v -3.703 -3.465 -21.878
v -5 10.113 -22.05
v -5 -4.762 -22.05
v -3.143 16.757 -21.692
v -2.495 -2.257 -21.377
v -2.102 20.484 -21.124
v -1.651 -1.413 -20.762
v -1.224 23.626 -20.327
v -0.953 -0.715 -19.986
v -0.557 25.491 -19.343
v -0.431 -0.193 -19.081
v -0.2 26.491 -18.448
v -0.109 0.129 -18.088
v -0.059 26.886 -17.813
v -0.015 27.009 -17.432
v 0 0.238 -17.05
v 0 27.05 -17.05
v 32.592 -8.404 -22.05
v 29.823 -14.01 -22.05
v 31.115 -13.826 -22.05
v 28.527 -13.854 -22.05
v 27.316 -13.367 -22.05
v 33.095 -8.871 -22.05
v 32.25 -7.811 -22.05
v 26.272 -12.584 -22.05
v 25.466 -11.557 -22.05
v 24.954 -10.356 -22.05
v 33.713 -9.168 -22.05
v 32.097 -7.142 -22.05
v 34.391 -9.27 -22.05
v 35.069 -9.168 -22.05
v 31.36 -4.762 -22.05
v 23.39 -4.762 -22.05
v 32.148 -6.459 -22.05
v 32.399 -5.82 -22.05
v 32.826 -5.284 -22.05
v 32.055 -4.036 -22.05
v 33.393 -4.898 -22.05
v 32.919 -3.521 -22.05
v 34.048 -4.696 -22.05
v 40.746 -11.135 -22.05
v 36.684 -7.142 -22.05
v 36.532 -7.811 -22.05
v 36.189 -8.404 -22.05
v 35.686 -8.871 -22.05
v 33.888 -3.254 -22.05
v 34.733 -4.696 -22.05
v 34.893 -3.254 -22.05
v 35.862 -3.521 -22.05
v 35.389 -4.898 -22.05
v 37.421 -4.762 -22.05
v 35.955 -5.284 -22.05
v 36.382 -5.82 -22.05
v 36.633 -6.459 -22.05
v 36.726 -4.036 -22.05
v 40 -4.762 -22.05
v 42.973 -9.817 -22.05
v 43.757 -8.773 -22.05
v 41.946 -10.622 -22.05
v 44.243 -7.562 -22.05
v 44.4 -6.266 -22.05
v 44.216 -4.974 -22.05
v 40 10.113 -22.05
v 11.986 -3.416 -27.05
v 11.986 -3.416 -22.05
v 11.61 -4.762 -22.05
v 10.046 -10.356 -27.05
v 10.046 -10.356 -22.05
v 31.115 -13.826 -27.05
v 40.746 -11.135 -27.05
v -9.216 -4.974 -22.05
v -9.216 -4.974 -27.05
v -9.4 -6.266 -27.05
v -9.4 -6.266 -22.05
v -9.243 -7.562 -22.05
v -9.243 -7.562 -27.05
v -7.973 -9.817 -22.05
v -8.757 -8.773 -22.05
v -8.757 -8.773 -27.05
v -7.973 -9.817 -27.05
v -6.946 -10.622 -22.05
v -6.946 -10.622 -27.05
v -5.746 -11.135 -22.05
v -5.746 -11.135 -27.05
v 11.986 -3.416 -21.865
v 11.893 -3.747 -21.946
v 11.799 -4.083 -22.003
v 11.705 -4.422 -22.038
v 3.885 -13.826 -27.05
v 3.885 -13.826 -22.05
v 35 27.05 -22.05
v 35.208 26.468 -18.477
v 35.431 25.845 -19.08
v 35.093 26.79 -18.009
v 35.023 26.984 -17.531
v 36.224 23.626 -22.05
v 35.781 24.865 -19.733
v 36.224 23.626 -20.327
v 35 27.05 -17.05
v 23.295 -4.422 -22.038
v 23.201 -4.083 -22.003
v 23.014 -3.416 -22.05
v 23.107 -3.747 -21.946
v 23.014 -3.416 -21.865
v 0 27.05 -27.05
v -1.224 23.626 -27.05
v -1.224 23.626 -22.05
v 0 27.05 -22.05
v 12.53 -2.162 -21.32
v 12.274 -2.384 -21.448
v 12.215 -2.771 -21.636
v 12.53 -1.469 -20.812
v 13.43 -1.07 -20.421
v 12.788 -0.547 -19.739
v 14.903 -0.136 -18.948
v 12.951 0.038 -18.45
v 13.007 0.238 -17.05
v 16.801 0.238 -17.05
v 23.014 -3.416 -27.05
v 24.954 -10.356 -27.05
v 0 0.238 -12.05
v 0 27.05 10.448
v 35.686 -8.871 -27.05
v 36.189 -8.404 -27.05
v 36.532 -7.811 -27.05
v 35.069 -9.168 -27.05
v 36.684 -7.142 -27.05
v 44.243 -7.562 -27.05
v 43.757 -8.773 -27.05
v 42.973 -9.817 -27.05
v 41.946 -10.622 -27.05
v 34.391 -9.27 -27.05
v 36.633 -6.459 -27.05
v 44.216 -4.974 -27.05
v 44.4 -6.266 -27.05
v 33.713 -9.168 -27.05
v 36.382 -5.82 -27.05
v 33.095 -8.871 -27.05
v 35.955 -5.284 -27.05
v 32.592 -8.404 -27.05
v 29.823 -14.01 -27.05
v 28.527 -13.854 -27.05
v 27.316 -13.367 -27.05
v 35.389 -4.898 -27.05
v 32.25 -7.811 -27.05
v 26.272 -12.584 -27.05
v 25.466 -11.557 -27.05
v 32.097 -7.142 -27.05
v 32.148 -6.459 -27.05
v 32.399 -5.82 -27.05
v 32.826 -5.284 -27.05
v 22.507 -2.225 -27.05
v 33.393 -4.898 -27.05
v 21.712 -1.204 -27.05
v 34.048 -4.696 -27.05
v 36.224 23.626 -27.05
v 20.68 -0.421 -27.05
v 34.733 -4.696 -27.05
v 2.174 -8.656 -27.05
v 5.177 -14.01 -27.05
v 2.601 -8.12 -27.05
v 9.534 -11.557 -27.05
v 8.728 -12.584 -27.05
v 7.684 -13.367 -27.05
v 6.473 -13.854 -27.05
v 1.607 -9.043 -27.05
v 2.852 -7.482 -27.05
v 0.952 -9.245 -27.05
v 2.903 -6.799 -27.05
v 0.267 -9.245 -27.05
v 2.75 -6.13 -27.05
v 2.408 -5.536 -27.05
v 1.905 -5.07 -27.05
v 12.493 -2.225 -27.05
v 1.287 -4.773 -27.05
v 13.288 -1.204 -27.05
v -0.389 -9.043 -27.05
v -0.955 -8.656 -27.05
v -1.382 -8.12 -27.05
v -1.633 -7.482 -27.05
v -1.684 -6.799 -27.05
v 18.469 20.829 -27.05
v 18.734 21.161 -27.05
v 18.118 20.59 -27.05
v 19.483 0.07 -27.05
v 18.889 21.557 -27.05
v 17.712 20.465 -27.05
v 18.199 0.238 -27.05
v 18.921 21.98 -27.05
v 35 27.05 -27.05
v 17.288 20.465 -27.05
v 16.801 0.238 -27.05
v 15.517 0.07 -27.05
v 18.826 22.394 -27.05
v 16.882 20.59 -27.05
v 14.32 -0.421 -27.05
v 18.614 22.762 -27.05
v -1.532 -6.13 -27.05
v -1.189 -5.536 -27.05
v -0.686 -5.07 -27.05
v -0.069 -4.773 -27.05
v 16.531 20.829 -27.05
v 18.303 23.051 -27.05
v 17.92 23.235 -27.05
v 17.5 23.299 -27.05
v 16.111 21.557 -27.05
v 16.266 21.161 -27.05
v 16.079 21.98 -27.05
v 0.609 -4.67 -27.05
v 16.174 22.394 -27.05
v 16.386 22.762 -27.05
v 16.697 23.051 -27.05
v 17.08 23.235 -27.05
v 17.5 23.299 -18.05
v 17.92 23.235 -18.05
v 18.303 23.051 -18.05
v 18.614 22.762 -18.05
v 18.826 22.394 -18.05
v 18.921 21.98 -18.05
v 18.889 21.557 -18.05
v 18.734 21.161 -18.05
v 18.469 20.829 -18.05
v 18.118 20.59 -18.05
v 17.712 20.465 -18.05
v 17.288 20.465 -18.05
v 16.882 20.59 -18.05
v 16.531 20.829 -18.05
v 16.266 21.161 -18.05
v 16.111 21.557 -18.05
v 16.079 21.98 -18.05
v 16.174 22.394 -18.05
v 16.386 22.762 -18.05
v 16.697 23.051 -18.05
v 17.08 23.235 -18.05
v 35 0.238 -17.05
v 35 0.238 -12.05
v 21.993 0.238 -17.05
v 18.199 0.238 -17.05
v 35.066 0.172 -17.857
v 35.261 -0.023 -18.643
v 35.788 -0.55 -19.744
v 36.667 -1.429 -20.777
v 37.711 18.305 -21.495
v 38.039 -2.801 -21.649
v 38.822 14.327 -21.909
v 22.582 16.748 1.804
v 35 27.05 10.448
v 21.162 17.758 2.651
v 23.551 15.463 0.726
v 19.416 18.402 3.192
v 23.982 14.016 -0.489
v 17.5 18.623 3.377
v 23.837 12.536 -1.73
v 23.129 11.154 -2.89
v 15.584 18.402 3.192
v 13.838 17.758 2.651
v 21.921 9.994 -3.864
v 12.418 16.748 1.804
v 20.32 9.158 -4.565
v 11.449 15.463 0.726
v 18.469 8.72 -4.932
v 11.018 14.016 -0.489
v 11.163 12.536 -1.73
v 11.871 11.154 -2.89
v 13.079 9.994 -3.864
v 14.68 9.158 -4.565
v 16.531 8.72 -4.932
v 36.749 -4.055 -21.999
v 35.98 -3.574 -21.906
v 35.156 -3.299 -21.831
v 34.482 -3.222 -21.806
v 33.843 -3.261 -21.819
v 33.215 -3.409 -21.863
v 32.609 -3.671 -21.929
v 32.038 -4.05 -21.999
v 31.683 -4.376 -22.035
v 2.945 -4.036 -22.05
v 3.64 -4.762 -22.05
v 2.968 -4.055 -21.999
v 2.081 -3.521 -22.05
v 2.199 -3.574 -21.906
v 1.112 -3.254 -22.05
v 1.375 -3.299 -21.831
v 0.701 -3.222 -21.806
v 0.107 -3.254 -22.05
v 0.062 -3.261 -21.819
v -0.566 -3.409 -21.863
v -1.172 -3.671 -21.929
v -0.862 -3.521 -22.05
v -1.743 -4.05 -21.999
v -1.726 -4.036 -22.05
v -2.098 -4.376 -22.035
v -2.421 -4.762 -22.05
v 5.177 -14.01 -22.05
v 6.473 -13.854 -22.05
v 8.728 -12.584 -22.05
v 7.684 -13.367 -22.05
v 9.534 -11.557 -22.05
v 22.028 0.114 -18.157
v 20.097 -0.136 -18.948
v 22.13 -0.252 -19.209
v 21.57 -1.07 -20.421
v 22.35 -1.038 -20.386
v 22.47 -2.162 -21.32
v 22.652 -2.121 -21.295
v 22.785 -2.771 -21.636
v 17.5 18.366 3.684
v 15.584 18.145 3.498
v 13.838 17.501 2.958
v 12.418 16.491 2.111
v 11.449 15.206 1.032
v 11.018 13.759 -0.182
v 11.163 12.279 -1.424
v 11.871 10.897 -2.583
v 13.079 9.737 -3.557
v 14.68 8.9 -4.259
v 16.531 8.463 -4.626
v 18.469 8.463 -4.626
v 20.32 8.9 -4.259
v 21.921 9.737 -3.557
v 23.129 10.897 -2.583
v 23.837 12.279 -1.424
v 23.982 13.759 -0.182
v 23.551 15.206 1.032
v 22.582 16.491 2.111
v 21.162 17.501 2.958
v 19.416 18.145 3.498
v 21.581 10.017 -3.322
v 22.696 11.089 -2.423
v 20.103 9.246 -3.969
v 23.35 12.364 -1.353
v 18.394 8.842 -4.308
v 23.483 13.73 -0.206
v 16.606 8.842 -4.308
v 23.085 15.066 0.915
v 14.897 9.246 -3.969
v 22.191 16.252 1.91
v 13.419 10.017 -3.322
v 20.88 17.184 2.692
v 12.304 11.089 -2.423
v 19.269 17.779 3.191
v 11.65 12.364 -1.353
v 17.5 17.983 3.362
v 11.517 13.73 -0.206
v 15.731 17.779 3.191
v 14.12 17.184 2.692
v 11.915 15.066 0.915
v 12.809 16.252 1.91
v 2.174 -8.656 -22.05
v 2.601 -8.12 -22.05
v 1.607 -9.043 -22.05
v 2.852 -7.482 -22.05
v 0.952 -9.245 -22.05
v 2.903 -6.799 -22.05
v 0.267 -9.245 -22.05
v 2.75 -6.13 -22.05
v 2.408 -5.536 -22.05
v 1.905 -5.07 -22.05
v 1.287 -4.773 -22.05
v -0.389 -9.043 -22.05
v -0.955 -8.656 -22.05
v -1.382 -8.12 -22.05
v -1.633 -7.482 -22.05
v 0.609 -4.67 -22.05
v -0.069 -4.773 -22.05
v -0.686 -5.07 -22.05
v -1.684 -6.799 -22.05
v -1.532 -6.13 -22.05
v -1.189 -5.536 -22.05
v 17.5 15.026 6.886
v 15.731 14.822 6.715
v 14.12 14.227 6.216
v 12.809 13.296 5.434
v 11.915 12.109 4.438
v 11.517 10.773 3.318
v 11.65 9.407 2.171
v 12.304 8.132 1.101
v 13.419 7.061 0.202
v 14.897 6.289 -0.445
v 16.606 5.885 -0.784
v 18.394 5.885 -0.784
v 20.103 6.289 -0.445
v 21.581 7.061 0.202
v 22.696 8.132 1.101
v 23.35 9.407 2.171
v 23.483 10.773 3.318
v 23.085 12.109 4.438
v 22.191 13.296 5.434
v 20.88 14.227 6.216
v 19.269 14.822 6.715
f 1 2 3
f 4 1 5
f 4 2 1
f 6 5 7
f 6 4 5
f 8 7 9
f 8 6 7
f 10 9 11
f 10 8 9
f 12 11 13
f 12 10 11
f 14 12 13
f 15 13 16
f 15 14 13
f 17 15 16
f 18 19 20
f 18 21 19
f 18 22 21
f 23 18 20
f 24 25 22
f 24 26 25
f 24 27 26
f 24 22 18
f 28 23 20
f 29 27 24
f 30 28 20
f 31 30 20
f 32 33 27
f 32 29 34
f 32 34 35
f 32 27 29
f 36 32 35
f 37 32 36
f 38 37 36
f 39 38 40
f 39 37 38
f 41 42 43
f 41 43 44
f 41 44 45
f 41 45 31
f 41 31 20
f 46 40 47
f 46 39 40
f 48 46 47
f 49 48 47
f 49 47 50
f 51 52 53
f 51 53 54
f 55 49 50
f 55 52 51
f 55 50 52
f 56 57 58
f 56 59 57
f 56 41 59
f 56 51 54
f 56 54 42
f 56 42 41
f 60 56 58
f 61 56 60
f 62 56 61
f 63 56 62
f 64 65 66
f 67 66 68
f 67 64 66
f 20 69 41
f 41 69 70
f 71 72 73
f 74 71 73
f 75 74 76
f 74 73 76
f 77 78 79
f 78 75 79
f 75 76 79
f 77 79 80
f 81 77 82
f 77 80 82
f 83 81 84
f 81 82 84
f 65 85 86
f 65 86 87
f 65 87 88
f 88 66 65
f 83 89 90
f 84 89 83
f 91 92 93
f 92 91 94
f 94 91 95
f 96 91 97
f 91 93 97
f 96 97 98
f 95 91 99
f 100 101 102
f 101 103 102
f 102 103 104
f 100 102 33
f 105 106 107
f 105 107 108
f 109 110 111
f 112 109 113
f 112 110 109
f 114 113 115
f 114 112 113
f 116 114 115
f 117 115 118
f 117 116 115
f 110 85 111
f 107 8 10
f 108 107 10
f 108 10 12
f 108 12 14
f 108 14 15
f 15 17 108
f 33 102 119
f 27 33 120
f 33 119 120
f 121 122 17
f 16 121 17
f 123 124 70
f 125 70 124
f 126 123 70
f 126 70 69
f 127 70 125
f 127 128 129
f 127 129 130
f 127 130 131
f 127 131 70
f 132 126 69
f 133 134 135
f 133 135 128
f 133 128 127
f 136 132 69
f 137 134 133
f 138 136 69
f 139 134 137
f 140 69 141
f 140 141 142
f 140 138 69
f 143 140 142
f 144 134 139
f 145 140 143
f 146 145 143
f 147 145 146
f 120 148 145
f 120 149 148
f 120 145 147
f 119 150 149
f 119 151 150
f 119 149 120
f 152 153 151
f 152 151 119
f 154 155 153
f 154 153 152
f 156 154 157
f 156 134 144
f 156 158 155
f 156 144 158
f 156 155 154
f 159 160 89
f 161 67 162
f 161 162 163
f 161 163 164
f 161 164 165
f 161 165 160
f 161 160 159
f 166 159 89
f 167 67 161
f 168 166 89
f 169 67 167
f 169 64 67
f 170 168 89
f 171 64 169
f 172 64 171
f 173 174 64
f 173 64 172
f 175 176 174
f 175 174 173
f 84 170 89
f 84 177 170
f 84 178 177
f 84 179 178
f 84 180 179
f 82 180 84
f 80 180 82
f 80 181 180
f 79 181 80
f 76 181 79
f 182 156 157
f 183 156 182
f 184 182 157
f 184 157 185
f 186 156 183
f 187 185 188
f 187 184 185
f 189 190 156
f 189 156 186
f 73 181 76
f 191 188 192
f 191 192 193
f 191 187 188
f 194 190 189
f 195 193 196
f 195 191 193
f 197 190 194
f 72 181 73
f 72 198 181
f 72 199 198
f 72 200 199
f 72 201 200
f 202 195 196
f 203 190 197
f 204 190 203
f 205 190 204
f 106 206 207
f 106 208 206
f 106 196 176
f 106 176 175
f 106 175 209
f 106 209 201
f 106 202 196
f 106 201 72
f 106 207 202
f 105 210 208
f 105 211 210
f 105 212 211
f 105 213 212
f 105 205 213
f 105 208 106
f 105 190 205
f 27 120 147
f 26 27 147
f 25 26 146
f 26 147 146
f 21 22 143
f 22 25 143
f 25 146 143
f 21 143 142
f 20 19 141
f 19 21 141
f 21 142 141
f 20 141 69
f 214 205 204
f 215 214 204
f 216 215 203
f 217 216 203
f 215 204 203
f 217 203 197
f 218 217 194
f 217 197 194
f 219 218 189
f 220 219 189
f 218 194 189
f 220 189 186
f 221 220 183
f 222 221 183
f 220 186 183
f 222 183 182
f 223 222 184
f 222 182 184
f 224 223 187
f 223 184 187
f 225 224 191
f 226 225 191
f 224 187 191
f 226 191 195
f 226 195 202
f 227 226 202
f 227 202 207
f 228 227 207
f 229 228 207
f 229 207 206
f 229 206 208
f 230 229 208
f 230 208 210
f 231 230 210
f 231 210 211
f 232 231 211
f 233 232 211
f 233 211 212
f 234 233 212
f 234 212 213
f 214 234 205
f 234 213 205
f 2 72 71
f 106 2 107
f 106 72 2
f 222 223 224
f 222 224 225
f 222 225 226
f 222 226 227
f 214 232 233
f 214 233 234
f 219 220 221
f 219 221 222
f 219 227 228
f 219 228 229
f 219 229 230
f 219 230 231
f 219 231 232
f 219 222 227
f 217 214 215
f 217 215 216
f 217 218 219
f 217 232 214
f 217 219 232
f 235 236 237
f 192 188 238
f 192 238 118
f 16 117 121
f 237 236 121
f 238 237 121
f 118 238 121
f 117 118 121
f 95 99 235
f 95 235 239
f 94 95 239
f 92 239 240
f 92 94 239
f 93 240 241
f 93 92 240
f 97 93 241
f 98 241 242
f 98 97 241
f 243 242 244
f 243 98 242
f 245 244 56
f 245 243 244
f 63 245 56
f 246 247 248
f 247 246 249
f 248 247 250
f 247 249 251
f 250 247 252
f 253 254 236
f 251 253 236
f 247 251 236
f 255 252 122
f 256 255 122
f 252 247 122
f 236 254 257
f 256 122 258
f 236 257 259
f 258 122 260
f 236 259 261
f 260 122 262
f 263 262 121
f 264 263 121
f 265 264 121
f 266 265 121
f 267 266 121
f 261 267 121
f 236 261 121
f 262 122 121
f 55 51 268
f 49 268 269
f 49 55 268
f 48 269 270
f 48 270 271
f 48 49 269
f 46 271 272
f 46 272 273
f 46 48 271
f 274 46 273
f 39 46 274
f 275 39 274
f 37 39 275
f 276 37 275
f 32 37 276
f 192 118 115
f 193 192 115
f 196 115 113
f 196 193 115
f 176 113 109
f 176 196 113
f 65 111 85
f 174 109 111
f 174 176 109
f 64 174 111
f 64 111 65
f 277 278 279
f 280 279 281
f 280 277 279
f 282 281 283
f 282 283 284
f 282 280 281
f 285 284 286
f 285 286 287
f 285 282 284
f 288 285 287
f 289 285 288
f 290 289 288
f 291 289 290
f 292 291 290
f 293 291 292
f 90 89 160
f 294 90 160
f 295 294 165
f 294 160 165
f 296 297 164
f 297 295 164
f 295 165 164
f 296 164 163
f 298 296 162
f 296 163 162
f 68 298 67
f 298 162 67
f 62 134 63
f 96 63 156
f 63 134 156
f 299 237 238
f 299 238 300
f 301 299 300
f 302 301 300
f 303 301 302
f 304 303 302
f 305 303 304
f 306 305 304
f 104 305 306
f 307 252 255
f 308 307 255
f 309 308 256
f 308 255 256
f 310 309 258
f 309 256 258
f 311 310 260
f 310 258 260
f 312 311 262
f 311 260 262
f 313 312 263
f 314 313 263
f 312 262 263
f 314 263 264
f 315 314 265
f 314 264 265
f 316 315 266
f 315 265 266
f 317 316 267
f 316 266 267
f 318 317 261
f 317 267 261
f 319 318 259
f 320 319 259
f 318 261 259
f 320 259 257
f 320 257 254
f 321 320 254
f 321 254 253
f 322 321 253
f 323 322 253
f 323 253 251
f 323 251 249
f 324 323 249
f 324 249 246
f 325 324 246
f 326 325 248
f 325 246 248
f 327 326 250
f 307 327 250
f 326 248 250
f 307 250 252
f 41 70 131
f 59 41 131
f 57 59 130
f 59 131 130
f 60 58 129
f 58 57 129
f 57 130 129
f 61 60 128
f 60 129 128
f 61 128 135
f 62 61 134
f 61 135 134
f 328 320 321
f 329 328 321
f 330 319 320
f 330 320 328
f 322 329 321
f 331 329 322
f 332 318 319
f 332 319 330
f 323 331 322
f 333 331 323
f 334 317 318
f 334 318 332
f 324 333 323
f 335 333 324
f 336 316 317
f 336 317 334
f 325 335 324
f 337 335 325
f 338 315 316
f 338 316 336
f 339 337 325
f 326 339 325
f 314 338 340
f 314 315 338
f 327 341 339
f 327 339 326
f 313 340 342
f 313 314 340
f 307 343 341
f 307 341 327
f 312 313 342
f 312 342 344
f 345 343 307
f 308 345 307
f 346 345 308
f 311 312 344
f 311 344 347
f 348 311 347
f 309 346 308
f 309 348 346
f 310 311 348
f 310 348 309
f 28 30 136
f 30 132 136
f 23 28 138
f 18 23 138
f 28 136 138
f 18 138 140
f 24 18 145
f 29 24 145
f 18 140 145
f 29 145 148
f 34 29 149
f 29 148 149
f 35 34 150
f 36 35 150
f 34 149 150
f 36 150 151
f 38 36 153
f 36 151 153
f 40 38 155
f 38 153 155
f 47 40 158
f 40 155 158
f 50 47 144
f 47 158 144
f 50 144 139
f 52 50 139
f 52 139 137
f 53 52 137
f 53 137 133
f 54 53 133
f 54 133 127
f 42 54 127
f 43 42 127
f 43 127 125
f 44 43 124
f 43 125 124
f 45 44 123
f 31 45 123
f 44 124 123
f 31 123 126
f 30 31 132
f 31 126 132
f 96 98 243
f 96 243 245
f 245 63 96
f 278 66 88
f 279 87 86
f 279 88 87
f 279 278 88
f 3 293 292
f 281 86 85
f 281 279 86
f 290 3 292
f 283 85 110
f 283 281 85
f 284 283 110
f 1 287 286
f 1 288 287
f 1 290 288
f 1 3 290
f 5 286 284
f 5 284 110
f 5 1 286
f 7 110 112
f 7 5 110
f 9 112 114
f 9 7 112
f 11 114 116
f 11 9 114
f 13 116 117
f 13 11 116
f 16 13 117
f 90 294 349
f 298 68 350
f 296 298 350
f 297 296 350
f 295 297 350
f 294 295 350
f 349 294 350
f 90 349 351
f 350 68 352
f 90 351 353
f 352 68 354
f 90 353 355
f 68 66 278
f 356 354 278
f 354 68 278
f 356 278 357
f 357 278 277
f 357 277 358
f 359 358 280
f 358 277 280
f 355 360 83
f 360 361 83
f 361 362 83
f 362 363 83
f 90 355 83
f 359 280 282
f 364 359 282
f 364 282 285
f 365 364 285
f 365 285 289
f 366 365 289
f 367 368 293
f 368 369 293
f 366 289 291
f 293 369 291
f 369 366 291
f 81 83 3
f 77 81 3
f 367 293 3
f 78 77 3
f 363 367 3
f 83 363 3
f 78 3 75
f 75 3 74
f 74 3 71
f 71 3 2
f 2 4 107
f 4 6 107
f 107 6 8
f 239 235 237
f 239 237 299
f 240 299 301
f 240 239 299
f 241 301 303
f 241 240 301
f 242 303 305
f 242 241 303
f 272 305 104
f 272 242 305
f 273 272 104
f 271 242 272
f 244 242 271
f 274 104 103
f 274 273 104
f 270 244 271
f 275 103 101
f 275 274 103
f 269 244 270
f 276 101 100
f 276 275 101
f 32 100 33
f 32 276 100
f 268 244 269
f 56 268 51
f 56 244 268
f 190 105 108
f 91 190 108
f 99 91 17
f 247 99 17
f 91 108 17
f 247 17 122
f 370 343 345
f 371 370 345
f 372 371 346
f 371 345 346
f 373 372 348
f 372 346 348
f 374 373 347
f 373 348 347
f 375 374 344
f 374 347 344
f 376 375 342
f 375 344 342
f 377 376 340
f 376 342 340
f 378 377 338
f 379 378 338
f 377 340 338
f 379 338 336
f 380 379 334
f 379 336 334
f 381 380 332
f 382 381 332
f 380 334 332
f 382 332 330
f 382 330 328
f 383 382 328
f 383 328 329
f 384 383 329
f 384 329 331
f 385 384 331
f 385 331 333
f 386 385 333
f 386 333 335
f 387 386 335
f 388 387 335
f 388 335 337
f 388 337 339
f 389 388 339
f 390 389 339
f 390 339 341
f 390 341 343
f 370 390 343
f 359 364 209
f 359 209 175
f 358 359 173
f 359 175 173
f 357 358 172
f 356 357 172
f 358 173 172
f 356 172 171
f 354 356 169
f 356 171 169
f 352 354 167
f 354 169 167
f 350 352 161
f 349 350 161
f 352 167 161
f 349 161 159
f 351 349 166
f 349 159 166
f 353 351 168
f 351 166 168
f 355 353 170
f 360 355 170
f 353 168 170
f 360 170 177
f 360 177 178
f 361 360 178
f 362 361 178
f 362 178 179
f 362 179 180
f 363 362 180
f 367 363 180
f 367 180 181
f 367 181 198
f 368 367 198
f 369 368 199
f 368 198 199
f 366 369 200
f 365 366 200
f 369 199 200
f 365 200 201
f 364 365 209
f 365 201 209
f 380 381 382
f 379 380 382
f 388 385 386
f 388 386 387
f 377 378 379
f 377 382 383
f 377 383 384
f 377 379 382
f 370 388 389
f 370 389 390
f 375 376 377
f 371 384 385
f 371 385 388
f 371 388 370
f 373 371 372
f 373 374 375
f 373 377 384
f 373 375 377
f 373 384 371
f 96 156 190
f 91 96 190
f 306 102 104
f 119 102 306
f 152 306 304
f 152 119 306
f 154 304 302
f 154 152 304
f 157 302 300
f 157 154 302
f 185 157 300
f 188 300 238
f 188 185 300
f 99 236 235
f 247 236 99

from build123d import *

# Parameters (mm, degrees)
AUFSATZ_LINEAR_AUSTRAGEN1_DEPTH    = 35
SKIZZE3_R                          = 6
AUFSATZ_LINEAR_AUSTRAGEN2_DEPTH    = 5
SKIZZE4_R                          = 6.5
AUFSATZ_LINEAR_AUSTRAGEN3_DEPTH    = 0.4
K_RPER_VERSCHIEBEN_KOPIEREN1_ANGLE = 90
SKIZZE9_R                          = 2.3
AUFSATZ_LINEAR_AUSTRAGEN4_DEPTH    = 5
VERRUNDUNG1_R                      = 5
SKIZZE11_R                         = 3.75
SCHNITT_LINEAR_AUSTRAGEN2_DEPTH    = 10
SKIZZE12_R                         = 1.425
SCHNITT_LINEAR_AUSTRAGEN3_DEPTH    = 9


with BuildPart() as part:
    # Skizze1 → Aufsatz-Linear austragen1 (new body)
    with BuildSketch(Plane(origin=(0, 0, 0), x_dir=(0, 0, -1), z_dir=(1, 0, 0))):
        Polygon((0, 0), (26.811555509, 0), (26.811555509, 37.497566339), (0, 15), align=None)
    extrude(amount=AUFSATZ_LINEAR_AUSTRAGEN1_DEPTH)

    # Skizze3 → Aufsatz-Linear austragen2 (add)
    with BuildSketch(Plane(origin=(0, 8.802361333, 7.386058148), x_dir=(1, 0, 0), z_dir=(0, 0.7660444431189768, 0.642787609686541))):
        with Locations(Location((17.5, 27.141814145, 0), (0, 0, 90))):
            Circle(SKIZZE3_R)
    extrude(amount=AUFSATZ_LINEAR_AUSTRAGEN2_DEPTH)

    # Skizze4 → Aufsatz-Linear austragen3 (add)
    with BuildSketch(Plane(origin=(0, 8.802361333, 7.386058148), x_dir=(1, 0, 0), z_dir=(0, 0.7660444431189767, 0.6427876096865409))):
        with Locations(Location((17.5, 27.141814145, 0), (0, 0, 90))):
            Circle(SKIZZE4_R)
    extrude(amount=AUFSATZ_LINEAR_AUSTRAGEN3_DEPTH)


with BuildPart() as part_1:
    # Körper-Verschieben/Kopieren1: moved
    add(part.part.rotate(Axis((0, 13.64378317, -13.405777755), (1, 0, 0)), K_RPER_VERSCHIEBEN_KOPIEREN1_ANGLE))

    # Skizze9 → Aufsatz-Linear austragen4 (add)
    # profile 1 of 2: a face of its own
    with BuildSketch(Plane(origin=(0, 0, -27.049560924), x_dir=(-1, 0, 0), z_dir=(0, 0, -1))):
        Polygon((-13.006801175, 0.238005415), (-8.700779715, -15.171672686), (10.561317912, -9.789145862), (1.223844944, 23.626259531), (0, 27.049560924), (0, 0.238005415), align=None)
        with Locations(Location((-0.609417277, -6.970434083, 0), (0, 0, 90))):
            Circle(SKIZZE9_R, mode=Mode.SUBTRACT)
    # profile 2 of 2: a face of its own
    with BuildSketch(Plane(origin=(0, 0, -27.049560924), x_dir=(-1, 0, 0), z_dir=(0, 0, -1))):
        Polygon((-45.561317912, -9.789145862), (-36.223844944, 23.626259531), (-35, 27.049560924), (-35, 0.238005415), (-21.993198825, 0.238005415), (-26.299220285, -15.171672686), align=None)
        with Locations(Location((-34.390582723, -6.970434083, 0), (0, 0, 270))):
            Circle(SKIZZE9_R, mode=Mode.SUBTRACT)
    extrude(amount=-AUFSATZ_LINEAR_AUSTRAGEN4_DEPTH)

    # Verrundung1
    # the kernel refuses this fillet: 5 mm, written as the material it adds along each edge
    with BuildSketch(Plane(origin=(35, 27.049560924, -22.049560924), x_dir=(1, 0, 0), z_dir=(0, -1, 0))) as verrundung1_piece_1_section:
        with BuildLine():
            CenterArc((VERRUNDUNG1_R, VERRUNDUNG1_R), VERRUNDUNG1_R, 180, 90)
            Line((0, VERRUNDUNG1_R), (-VERRUNDUNG1_R * 0.02, VERRUNDUNG1_R))
            Line((-VERRUNDUNG1_R * 0.02, VERRUNDUNG1_R), (-VERRUNDUNG1_R * 0.02, -VERRUNDUNG1_R * 0.02))
            Line((-VERRUNDUNG1_R * 0.02, -VERRUNDUNG1_R * 0.02), (VERRUNDUNG1_R, -VERRUNDUNG1_R * 0.02))
            Line((VERRUNDUNG1_R, -VERRUNDUNG1_R * 0.02), (VERRUNDUNG1_R, 0))
        make_face()
    verrundung1_piece_1 = extrude(amount=26.811555509, mode=Mode.PRIVATE)
    verrundung1_piece_1 = split(verrundung1_piece_1, bisect_by=Plane(origin=(39.17481741, 13.065806869, -20.82374956), z_dir=(-0.9631048813334838, -0.2691263412444353, -1.6244750072279728e-13)), keep=Keep.TOP, mode=Mode.PRIVATE)
    verrundung1_piece_1 = split(verrundung1_piece_1, bisect_by=Plane(origin=(39.826476164, 13.549090416, -20.82374956), z_dir=(-0.9416340631335743, -0.3366382199729496, -2.0319838344143382e-13)), keep=Keep.TOP, mode=Mode.PRIVATE)
    add(verrundung1_piece_1)
    with BuildSketch(Plane(origin=(35, 0.238005415, -22.049560924), x_dir=(0, 0, 1), z_dir=(-1, 0, 0))) as verrundung1_piece_2_section:
        with BuildLine():
            CenterArc((VERRUNDUNG1_R, -VERRUNDUNG1_R), VERRUNDUNG1_R, 90, 90)
            Line((0, -VERRUNDUNG1_R), (-VERRUNDUNG1_R * 0.02, -VERRUNDUNG1_R))
            Line((-VERRUNDUNG1_R * 0.02, -VERRUNDUNG1_R), (-VERRUNDUNG1_R * 0.02, VERRUNDUNG1_R * 0.02))
            Line((-VERRUNDUNG1_R * 0.02, VERRUNDUNG1_R * 0.02), (VERRUNDUNG1_R, VERRUNDUNG1_R * 0.02))
            Line((VERRUNDUNG1_R, VERRUNDUNG1_R * 0.02), (VERRUNDUNG1_R, 0))
        make_face()
    verrundung1_piece_2 = extrude(amount=25.506801175, mode=Mode.PRIVATE)
    verrundung1_piece_2 = split(verrundung1_piece_2, bisect_by=Plane(origin=(22.762065147, -2.513486336, -20.902354356), z_dir=(0.9631048813334842, 0.2691263412444339, 1.6244750072279647e-13)), keep=Keep.TOP, mode=Mode.PRIVATE)
    verrundung1_piece_2 = verrundung1_piece_2 - Plane(origin=(34.390582723, -6.970434083, -20.902354356), x_dir=(0, -1, 0), z_dir=(0, 0, -1)) * Cylinder(2.3, 72, mode=Mode.PRIVATE)
    add(verrundung1_piece_2)
    with BuildSketch(Plane(origin=(35, 0.238005415, -22.049560924), x_dir=(0, 0, 1), z_dir=(-1, 0, 0))) as verrundung1_piece_3_section:
        with BuildLine():
            CenterArc((VERRUNDUNG1_R, -VERRUNDUNG1_R), VERRUNDUNG1_R, 90, 90)
            Line((0, -VERRUNDUNG1_R), (-VERRUNDUNG1_R * 0.02, -VERRUNDUNG1_R))
            Line((-VERRUNDUNG1_R * 0.02, -VERRUNDUNG1_R), (-VERRUNDUNG1_R * 0.02, VERRUNDUNG1_R * 0.02))
            Line((-VERRUNDUNG1_R * 0.02, VERRUNDUNG1_R * 0.02), (VERRUNDUNG1_R, VERRUNDUNG1_R * 0.02))
            Line((VERRUNDUNG1_R, VERRUNDUNG1_R * 0.02), (VERRUNDUNG1_R, 0))
        make_face()
    verrundung1_piece_3 = extrude(amount=25.506801175, mode=Mode.PRIVATE)
    verrundung1_piece_3 = split(verrundung1_piece_3, bisect_by=Plane(origin=(12.602046932, -1.210462189, -20.857593889), z_dir=(-0.9631048813334842, 0.26912634124443413, 1.6244750072279654e-13)), keep=Keep.TOP, mode=Mode.PRIVATE)
    add(verrundung1_piece_3)
    with BuildSketch(Plane(origin=(0, 0.238005415, -22.049560924), x_dir=(0, 0, 1), z_dir=(1, 0, 0))) as verrundung1_piece_4_section:
        with BuildLine():
            CenterArc((VERRUNDUNG1_R, VERRUNDUNG1_R), VERRUNDUNG1_R, 180, 90)
            Line((0, VERRUNDUNG1_R), (-VERRUNDUNG1_R * 0.02, VERRUNDUNG1_R))
            Line((-VERRUNDUNG1_R * 0.02, VERRUNDUNG1_R), (-VERRUNDUNG1_R * 0.02, -VERRUNDUNG1_R * 0.02))
            Line((-VERRUNDUNG1_R * 0.02, -VERRUNDUNG1_R * 0.02), (VERRUNDUNG1_R, -VERRUNDUNG1_R * 0.02))
            Line((VERRUNDUNG1_R, -VERRUNDUNG1_R * 0.02), (VERRUNDUNG1_R, 0))
        make_face()
    verrundung1_piece_4 = extrude(amount=25.506801175, mode=Mode.PRIVATE)
    verrundung1_piece_4 = split(verrundung1_piece_4, bisect_by=Plane(origin=(12.237934855, -2.513486327, -20.902354361), z_dir=(-0.9631048813334842, 0.26912634124443413, 1.6244750072279654e-13)), keep=Keep.TOP, mode=Mode.PRIVATE)
    verrundung1_piece_4 = verrundung1_piece_4 - Plane(origin=(0.609417277, -6.970434083, -20.902354361), x_dir=(0, 1, 0), z_dir=(0, 0, -1)) * Cylinder(2.3, 72, mode=Mode.PRIVATE)
    add(verrundung1_piece_4)
    with BuildSketch(Plane(origin=(0, 0.238005415, -22.049560924), x_dir=(0, 0, 1), z_dir=(1, 0, 0))) as verrundung1_piece_5_section:
        with BuildLine():
            CenterArc((VERRUNDUNG1_R, VERRUNDUNG1_R), VERRUNDUNG1_R, 180, 90)
            Line((0, VERRUNDUNG1_R), (-VERRUNDUNG1_R * 0.02, VERRUNDUNG1_R))
            Line((-VERRUNDUNG1_R * 0.02, VERRUNDUNG1_R), (-VERRUNDUNG1_R * 0.02, -VERRUNDUNG1_R * 0.02))
            Line((-VERRUNDUNG1_R * 0.02, -VERRUNDUNG1_R * 0.02), (VERRUNDUNG1_R, -VERRUNDUNG1_R * 0.02))
            Line((VERRUNDUNG1_R, -VERRUNDUNG1_R * 0.02), (VERRUNDUNG1_R, 0))
        make_face()
    verrundung1_piece_5 = extrude(amount=25.506801175, mode=Mode.PRIVATE)
    verrundung1_piece_5 = split(verrundung1_piece_5, bisect_by=Plane(origin=(22.397953068, -1.210462189, -20.857593889), z_dir=(0.9631048813334842, 0.2691263412444339, 1.6244750072279647e-13)), keep=Keep.TOP, mode=Mode.PRIVATE)
    add(verrundung1_piece_5)
    with BuildSketch(Plane(origin=(0, 27.049560924, -22.049560924), x_dir=(0, 0, 1), z_dir=(0, -1, 0))) as verrundung1_piece_6_section:
        with BuildLine():
            CenterArc((VERRUNDUNG1_R, VERRUNDUNG1_R), VERRUNDUNG1_R, 180, 90)
            Line((0, VERRUNDUNG1_R), (-VERRUNDUNG1_R * 0.02, VERRUNDUNG1_R))
            Line((-VERRUNDUNG1_R * 0.02, VERRUNDUNG1_R), (-VERRUNDUNG1_R * 0.02, -VERRUNDUNG1_R * 0.02))
            Line((-VERRUNDUNG1_R * 0.02, -VERRUNDUNG1_R * 0.02), (VERRUNDUNG1_R, -VERRUNDUNG1_R * 0.02))
            Line((VERRUNDUNG1_R, -VERRUNDUNG1_R * 0.02), (VERRUNDUNG1_R, 0))
        make_face()
    verrundung1_piece_6 = extrude(amount=26.811555509, mode=Mode.PRIVATE)
    verrundung1_piece_6 = split(verrundung1_piece_6, bisect_by=Plane(origin=(-4.17481741, 13.06580687, -20.82374956), z_dir=(0.9631048813334837, -0.26912634124443535, -1.6244750072279728e-13)), keep=Keep.TOP, mode=Mode.PRIVATE)
    verrundung1_piece_6 = split(verrundung1_piece_6, bisect_by=Plane(origin=(-4.826476163, 13.549090417, -20.82374956), z_dir=(0.9416340631335748, -0.3366382199729482, -2.0319838344143293e-13)), keep=Keep.TOP, mode=Mode.PRIVATE)
    add(verrundung1_piece_6)
    with BuildSketch(Plane(origin=(21.993198825, 0.238005415, -27.049560924), x_dir=(-1, 0, 0), z_dir=(0, 0, 1))) as verrundung1_piece_7:
        with BuildLine():
            CenterArc((VERRUNDUNG1_R * 0.758872343938, VERRUNDUNG1_R), VERRUNDUNG1_R, 195.612285688, 74.387714312)
            Line((-VERRUNDUNG1_R * 0.204232537396, VERRUNDUNG1_R * 0.730873658756), (-VERRUNDUNG1_R * 0.223494635022, VERRUNDUNG1_R * 0.725491131931))
            Line((-VERRUNDUNG1_R * 0.223494635022, VERRUNDUNG1_R * 0.725491131931), (-VERRUNDUNG1_R * 0.0151774468788, -VERRUNDUNG1_R * 0.02))
            Line((-VERRUNDUNG1_R * 0.0151774468788, -VERRUNDUNG1_R * 0.02), (VERRUNDUNG1_R * 0.758872343938, -VERRUNDUNG1_R * 0.02))
            Line((VERRUNDUNG1_R * 0.758872343938, -VERRUNDUNG1_R * 0.02), (VERRUNDUNG1_R * 0.758872343938, 0))
        make_face()
    extrude(amount=5)
    with BuildSketch(Plane(origin=(13.006801175, 0.238005415, -27.049560924), x_dir=(1, 0, 0), z_dir=(0, 0, 1))) as verrundung1_piece_8:
        with BuildLine():
            CenterArc((VERRUNDUNG1_R * 0.758872343938, -VERRUNDUNG1_R), VERRUNDUNG1_R, 90, 74.387714312)
            Line((-VERRUNDUNG1_R * 0.204232537396, -VERRUNDUNG1_R * 0.730873658756), (-VERRUNDUNG1_R * 0.223494635022, -VERRUNDUNG1_R * 0.725491131931))
            Line((-VERRUNDUNG1_R * 0.223494635022, -VERRUNDUNG1_R * 0.725491131931), (-VERRUNDUNG1_R * 0.0151774468788, VERRUNDUNG1_R * 0.02))
            Line((-VERRUNDUNG1_R * 0.0151774468788, VERRUNDUNG1_R * 0.02), (VERRUNDUNG1_R * 0.758872343938, VERRUNDUNG1_R * 0.02))
            Line((VERRUNDUNG1_R * 0.758872343938, VERRUNDUNG1_R * 0.02), (VERRUNDUNG1_R * 0.758872343938, 0))
        make_face()
    extrude(amount=5)
    with BuildSketch(Plane(origin=(47.5, 0.238005415, -22.049560924), x_dir=(0, 0, 1), z_dir=(-1, 0, 0))) as verrundung1_piece_9a_section:
        with BuildLine():
            CenterArc((VERRUNDUNG1_R, -VERRUNDUNG1_R), VERRUNDUNG1_R, 90, 90)
            Line((0, -VERRUNDUNG1_R), (-VERRUNDUNG1_R * 0.02, -VERRUNDUNG1_R))
            Line((-VERRUNDUNG1_R * 0.02, -VERRUNDUNG1_R), (-VERRUNDUNG1_R * 0.02, VERRUNDUNG1_R * 0.02))
            Line((-VERRUNDUNG1_R * 0.02, VERRUNDUNG1_R * 0.02), (VERRUNDUNG1_R, VERRUNDUNG1_R * 0.02))
            Line((VERRUNDUNG1_R, VERRUNDUNG1_R * 0.02), (VERRUNDUNG1_R, 0))
        make_face()
    verrundung1_piece_9a = extrude(amount=38.006801175, mode=Mode.PRIVATE)
    verrundung1_piece_9a = split(verrundung1_piece_9a, bisect_by=Plane(origin=(35, -0.934173805, -20.941336544), z_dir=(1, 0, 0)), keep=Keep.TOP, mode=Mode.PRIVATE)
    verrundung1_piece_9a = split(verrundung1_piece_9a, bisect_by=Plane(origin=(42.794054861, 0.1138779, -20.941336544), z_dir=(-0.9631048813334838, -0.2691263412444353, -1.6244750072279728e-13)), keep=Keep.TOP, mode=Mode.PRIVATE)
    with BuildSketch(Plane(origin=(35, 27.049560924, -22.049560924), x_dir=(1, 0, 0), z_dir=(0, -1, 0))) as verrundung1_piece_9b_section:
        with BuildLine():
            CenterArc((VERRUNDUNG1_R, VERRUNDUNG1_R), VERRUNDUNG1_R, 180, 90)
            Line((0, VERRUNDUNG1_R), (-VERRUNDUNG1_R * 0.02, VERRUNDUNG1_R))
            Line((-VERRUNDUNG1_R * 0.02, VERRUNDUNG1_R), (-VERRUNDUNG1_R * 0.02, -VERRUNDUNG1_R * 0.02))
            Line((-VERRUNDUNG1_R * 0.02, -VERRUNDUNG1_R * 0.02), (VERRUNDUNG1_R, -VERRUNDUNG1_R * 0.02))
            Line((VERRUNDUNG1_R, -VERRUNDUNG1_R * 0.02), (VERRUNDUNG1_R, 0))
        make_face()
    verrundung1_piece_9b = extrude(amount=39.311555509, mode=Mode.PRIVATE)
    verrundung1_piece_9b = split(verrundung1_piece_9b, bisect_by=Plane(origin=(38.695669586, 0.238005415, -21.917388299), z_dir=(0, -1, 0)), keep=Keep.TOP, mode=Mode.PRIVATE)
    verrundung1_piece_9b = split(verrundung1_piece_9b, bisect_by=Plane(origin=(39.091980364, -11.596912781, -21.917388299), z_dir=(-0.2691263412444344, 0.963104881333484, 5.813402738026697e-13)), keep=Keep.TOP, mode=Mode.PRIVATE)
    verrundung1_piece_9b = verrundung1_piece_9b - Plane(origin=(34.390582723, -6.970434083, -21.917388299), x_dir=(0, -1, 0), z_dir=(0, 0, -1)) * Cylinder(2.3, 99, mode=Mode.PRIVATE)
    verrundung1_piece_9 = verrundung1_piece_9a & verrundung1_piece_9b
    add(verrundung1_piece_9)
    with BuildSketch(Plane(origin=(21.993198825, 0.238005415, -27.049560924), x_dir=(-1, 0, 0), z_dir=(0, 0, 1))) as verrundung1_piece_10a_section:
        with BuildLine():
            CenterArc((VERRUNDUNG1_R * 0.758872343938, VERRUNDUNG1_R), VERRUNDUNG1_R, 195.612285688, 74.387714312)
            Line((-VERRUNDUNG1_R * 0.204232537396, VERRUNDUNG1_R * 0.730873658756), (-VERRUNDUNG1_R * 0.223494635022, VERRUNDUNG1_R * 0.725491131931))
            Line((-VERRUNDUNG1_R * 0.223494635022, VERRUNDUNG1_R * 0.725491131931), (-VERRUNDUNG1_R * 0.0151774468788, -VERRUNDUNG1_R * 0.02))
            Line((-VERRUNDUNG1_R * 0.0151774468788, -VERRUNDUNG1_R * 0.02), (VERRUNDUNG1_R * 0.758872343938, -VERRUNDUNG1_R * 0.02))
            Line((VERRUNDUNG1_R * 0.758872343938, -VERRUNDUNG1_R * 0.02), (VERRUNDUNG1_R * 0.758872343938, 0))
        make_face()
    verrundung1_piece_10a = extrude(amount=14.485904299, mode=Mode.PRIVATE)
    verrundung1_piece_10a = split(verrundung1_piece_10a, bisect_by=Plane(origin=(21.381573581, -0.567960502, -22.049560924), z_dir=(0, 0, 1)), keep=Keep.TOP, mode=Mode.PRIVATE)
    with BuildSketch(Plane(origin=(35, 0.238005415, -22.049560924), x_dir=(0, 0, 1), z_dir=(-1, 0, 0))) as verrundung1_piece_10b_section:
        with BuildLine():
            CenterArc((VERRUNDUNG1_R, -VERRUNDUNG1_R), VERRUNDUNG1_R, 90, 90)
            Line((0, -VERRUNDUNG1_R), (-VERRUNDUNG1_R * 0.02, -VERRUNDUNG1_R))
            Line((-VERRUNDUNG1_R * 0.02, -VERRUNDUNG1_R), (-VERRUNDUNG1_R * 0.02, VERRUNDUNG1_R * 0.02))
            Line((-VERRUNDUNG1_R * 0.02, VERRUNDUNG1_R * 0.02), (VERRUNDUNG1_R, VERRUNDUNG1_R * 0.02))
            Line((VERRUNDUNG1_R, VERRUNDUNG1_R * 0.02), (VERRUNDUNG1_R, 0))
        make_face()
    verrundung1_piece_10b = extrude(amount=25.506801175, mode=Mode.PRIVATE)
    verrundung1_piece_10b = split(verrundung1_piece_10b, bisect_by=Plane(origin=(13.021336565, 0.290022269, -20.957466714), z_dir=(0.9631048813334842, -0.26912634124443413, -1.6244750072279654e-13)), keep=Keep.TOP, mode=Mode.PRIVATE)
    verrundung1_piece_10b = split(verrundung1_piece_10b, bisect_by=Plane(origin=(21.978663435, 0.290022269, -20.957466714), z_dir=(-0.9631048813334842, -0.2691263412444339, -1.6244750072279647e-13)), keep=Keep.TOP, mode=Mode.PRIVATE)
    verrundung1_piece_10 = verrundung1_piece_10a & verrundung1_piece_10b
    add(verrundung1_piece_10)
    with BuildSketch(Plane(origin=(-12.5, 0.238005415, -22.049560924), x_dir=(0, 0, 1), z_dir=(1, 0, 0))) as verrundung1_piece_11a_section:
        with BuildLine():
            CenterArc((VERRUNDUNG1_R, VERRUNDUNG1_R), VERRUNDUNG1_R, 180, 90)
            Line((0, VERRUNDUNG1_R), (-VERRUNDUNG1_R * 0.02, VERRUNDUNG1_R))
            Line((-VERRUNDUNG1_R * 0.02, VERRUNDUNG1_R), (-VERRUNDUNG1_R * 0.02, -VERRUNDUNG1_R * 0.02))
            Line((-VERRUNDUNG1_R * 0.02, -VERRUNDUNG1_R * 0.02), (VERRUNDUNG1_R, -VERRUNDUNG1_R * 0.02))
            Line((VERRUNDUNG1_R, -VERRUNDUNG1_R * 0.02), (VERRUNDUNG1_R, 0))
        make_face()
    verrundung1_piece_11a = extrude(amount=38.006801175, mode=Mode.PRIVATE)
    verrundung1_piece_11a = split(verrundung1_piece_11a, bisect_by=Plane(origin=(0, -0.934173805, -20.941336544), z_dir=(-1, 0, 0)), keep=Keep.TOP, mode=Mode.PRIVATE)
    verrundung1_piece_11a = split(verrundung1_piece_11a, bisect_by=Plane(origin=(-7.794054861, 0.1138779, -20.941336544), z_dir=(0.9631048813334837, -0.26912634124443535, -1.6244750072279728e-13)), keep=Keep.TOP, mode=Mode.PRIVATE)
    with BuildSketch(Plane(origin=(0, 27.049560924, -22.049560924), x_dir=(0, 0, 1), z_dir=(0, -1, 0))) as verrundung1_piece_11b_section:
        with BuildLine():
            CenterArc((VERRUNDUNG1_R, VERRUNDUNG1_R), VERRUNDUNG1_R, 180, 90)
            Line((0, VERRUNDUNG1_R), (-VERRUNDUNG1_R * 0.02, VERRUNDUNG1_R))
            Line((-VERRUNDUNG1_R * 0.02, VERRUNDUNG1_R), (-VERRUNDUNG1_R * 0.02, -VERRUNDUNG1_R * 0.02))
            Line((-VERRUNDUNG1_R * 0.02, -VERRUNDUNG1_R * 0.02), (VERRUNDUNG1_R, -VERRUNDUNG1_R * 0.02))
            Line((VERRUNDUNG1_R, -VERRUNDUNG1_R * 0.02), (VERRUNDUNG1_R, 0))
        make_face()
    verrundung1_piece_11b = extrude(amount=39.311555509, mode=Mode.PRIVATE)
    verrundung1_piece_11b = split(verrundung1_piece_11b, bisect_by=Plane(origin=(-0.132172609, 0.238005415, -18.353891343), z_dir=(0, -1, 0)), keep=Keep.TOP, mode=Mode.PRIVATE)
    verrundung1_piece_11b = split(verrundung1_piece_11b, bisect_by=Plane(origin=(-0.786583865, -12.520560126, -18.353891343), z_dir=(0.2691263412444344, 0.963104881333484, 5.813402738026697e-13)), keep=Keep.TOP, mode=Mode.PRIVATE)
    verrundung1_piece_11b = verrundung1_piece_11b - Plane(origin=(0.609417277, -6.970434083, -18.353891343), x_dir=(0, 1, 0), z_dir=(0, 0, -1)) * Cylinder(2.3, 99, mode=Mode.PRIVATE)
    verrundung1_piece_11 = verrundung1_piece_11a & verrundung1_piece_11b
    add(verrundung1_piece_11)
    with BuildSketch(Plane(origin=(0, 0.238005415, -22.049560924), x_dir=(0, 0, 1), z_dir=(1, 0, 0))) as verrundung1_piece_12a_section:
        with BuildLine():
            CenterArc((VERRUNDUNG1_R, VERRUNDUNG1_R), VERRUNDUNG1_R, 180, 90)
            Line((0, VERRUNDUNG1_R), (-VERRUNDUNG1_R * 0.02, VERRUNDUNG1_R))
            Line((-VERRUNDUNG1_R * 0.02, VERRUNDUNG1_R), (-VERRUNDUNG1_R * 0.02, -VERRUNDUNG1_R * 0.02))
            Line((-VERRUNDUNG1_R * 0.02, -VERRUNDUNG1_R * 0.02), (VERRUNDUNG1_R, -VERRUNDUNG1_R * 0.02))
            Line((VERRUNDUNG1_R, -VERRUNDUNG1_R * 0.02), (VERRUNDUNG1_R, 0))
        make_face()
    verrundung1_piece_12a = extrude(amount=25.506801175, mode=Mode.PRIVATE)
    verrundung1_piece_12a = split(verrundung1_piece_12a, bisect_by=Plane(origin=(13.021336565, 0.290022269, -20.957466714), z_dir=(0.9631048813334842, -0.26912634124443413, -1.6244750072279654e-13)), keep=Keep.TOP, mode=Mode.PRIVATE)
    verrundung1_piece_12a = split(verrundung1_piece_12a, bisect_by=Plane(origin=(21.978663435, 0.290022269, -20.957466714), z_dir=(-0.9631048813334842, -0.2691263412444339, -1.6244750072279647e-13)), keep=Keep.TOP, mode=Mode.PRIVATE)
    with BuildSketch(Plane(origin=(13.006801175, 0.238005415, -27.049560924), x_dir=(1, 0, 0), z_dir=(0, 0, 1))) as verrundung1_piece_12b_section:
        with BuildLine():
            CenterArc((VERRUNDUNG1_R * 0.758872343938, -VERRUNDUNG1_R), VERRUNDUNG1_R, 90, 74.387714312)
            Line((-VERRUNDUNG1_R * 0.204232537396, -VERRUNDUNG1_R * 0.730873658756), (-VERRUNDUNG1_R * 0.223494635022, -VERRUNDUNG1_R * 0.725491131931))
            Line((-VERRUNDUNG1_R * 0.223494635022, -VERRUNDUNG1_R * 0.725491131931), (-VERRUNDUNG1_R * 0.0151774468788, VERRUNDUNG1_R * 0.02))
            Line((-VERRUNDUNG1_R * 0.0151774468788, VERRUNDUNG1_R * 0.02), (VERRUNDUNG1_R * 0.758872343938, VERRUNDUNG1_R * 0.02))
            Line((VERRUNDUNG1_R * 0.758872343938, VERRUNDUNG1_R * 0.02), (VERRUNDUNG1_R * 0.758872343938, 0))
        make_face()
    verrundung1_piece_12b = extrude(amount=14.485904299, mode=Mode.PRIVATE)
    verrundung1_piece_12b = split(verrundung1_piece_12b, bisect_by=Plane(origin=(13.618426419, -0.567960502, -22.049560924), z_dir=(0, 0, 1)), keep=Keep.TOP, mode=Mode.PRIVATE)
    verrundung1_piece_12 = verrundung1_piece_12a & verrundung1_piece_12b
    add(verrundung1_piece_12)
    # the kernel refuses this fillet: 5 mm, written as the material it takes off along each edge
    with BuildSketch(Plane(origin=(45.561317912, -9.789145861, -39.549560924), x_dir=(-0.2691263412444356, 0.9631048813334836, 5.813402738026695e-13), z_dir=(0, 0, 1)), Plane(origin=(26.299220285, -15.171672686, -39.549560924), x_dir=(0.9631048813334839, 0.2691263412444345, 1.6244750072279685e-13), z_dir=(0, 0, 1)), Plane(origin=(8.700779715, -15.171672686, -39.549560924), x_dir=(0.2691263412444342, 0.9631048813334839, 5.813402738026696e-13), z_dir=(0, 0, 1)), Plane(origin=(-10.561317912, -9.789145861, -39.549560924), x_dir=(0.9631048813334839, -0.2691263412444342, -1.6244750072279662e-13), z_dir=(0, 0, 1))) as verrundung1_2_piece_1:
        with BuildLine():
            CenterArc((VERRUNDUNG1_R, VERRUNDUNG1_R), VERRUNDUNG1_R, 180, 90)
            Line((0, VERRUNDUNG1_R), (-VERRUNDUNG1_R * 0.02, VERRUNDUNG1_R))
            Line((-VERRUNDUNG1_R * 0.02, VERRUNDUNG1_R), (-VERRUNDUNG1_R * 0.02, -VERRUNDUNG1_R * 0.02))
            Line((-VERRUNDUNG1_R * 0.02, -VERRUNDUNG1_R * 0.02), (VERRUNDUNG1_R, -VERRUNDUNG1_R * 0.02))
            Line((VERRUNDUNG1_R, -VERRUNDUNG1_R * 0.02), (VERRUNDUNG1_R, 0))
        make_face()
    extrude(amount=30, mode=Mode.SUBTRACT)

    # Skizze11 → Schnitt-Linear austragen2 (cut)
    with BuildSketch(Plane.XY.offset(-22.049560924)):
        with Locations((0.609417277, -6.970434083)):
            Circle(SKIZZE11_R)
        with Locations((34.390582723, -6.970434083)):
            Circle(SKIZZE11_R)
    extrude(amount=SCHNITT_LINEAR_AUSTRAGEN2_DEPTH, mode=Mode.SUBTRACT)

    # Skizze12 → Schnitt-Linear austragen3 (cut)
    with BuildSketch(Plane(origin=(0, 0, -27.049560924), x_dir=(-1, 0, 0), z_dir=(0, 0, -1))):
        with Locations(Location((-17.5, 21.873797801, 0), (0, 0, 90))):
            Circle(SKIZZE12_R)
    extrude(amount=-SCHNITT_LINEAR_AUSTRAGEN3_DEPTH, mode=Mode.SUBTRACT)


solid = part_1.part
